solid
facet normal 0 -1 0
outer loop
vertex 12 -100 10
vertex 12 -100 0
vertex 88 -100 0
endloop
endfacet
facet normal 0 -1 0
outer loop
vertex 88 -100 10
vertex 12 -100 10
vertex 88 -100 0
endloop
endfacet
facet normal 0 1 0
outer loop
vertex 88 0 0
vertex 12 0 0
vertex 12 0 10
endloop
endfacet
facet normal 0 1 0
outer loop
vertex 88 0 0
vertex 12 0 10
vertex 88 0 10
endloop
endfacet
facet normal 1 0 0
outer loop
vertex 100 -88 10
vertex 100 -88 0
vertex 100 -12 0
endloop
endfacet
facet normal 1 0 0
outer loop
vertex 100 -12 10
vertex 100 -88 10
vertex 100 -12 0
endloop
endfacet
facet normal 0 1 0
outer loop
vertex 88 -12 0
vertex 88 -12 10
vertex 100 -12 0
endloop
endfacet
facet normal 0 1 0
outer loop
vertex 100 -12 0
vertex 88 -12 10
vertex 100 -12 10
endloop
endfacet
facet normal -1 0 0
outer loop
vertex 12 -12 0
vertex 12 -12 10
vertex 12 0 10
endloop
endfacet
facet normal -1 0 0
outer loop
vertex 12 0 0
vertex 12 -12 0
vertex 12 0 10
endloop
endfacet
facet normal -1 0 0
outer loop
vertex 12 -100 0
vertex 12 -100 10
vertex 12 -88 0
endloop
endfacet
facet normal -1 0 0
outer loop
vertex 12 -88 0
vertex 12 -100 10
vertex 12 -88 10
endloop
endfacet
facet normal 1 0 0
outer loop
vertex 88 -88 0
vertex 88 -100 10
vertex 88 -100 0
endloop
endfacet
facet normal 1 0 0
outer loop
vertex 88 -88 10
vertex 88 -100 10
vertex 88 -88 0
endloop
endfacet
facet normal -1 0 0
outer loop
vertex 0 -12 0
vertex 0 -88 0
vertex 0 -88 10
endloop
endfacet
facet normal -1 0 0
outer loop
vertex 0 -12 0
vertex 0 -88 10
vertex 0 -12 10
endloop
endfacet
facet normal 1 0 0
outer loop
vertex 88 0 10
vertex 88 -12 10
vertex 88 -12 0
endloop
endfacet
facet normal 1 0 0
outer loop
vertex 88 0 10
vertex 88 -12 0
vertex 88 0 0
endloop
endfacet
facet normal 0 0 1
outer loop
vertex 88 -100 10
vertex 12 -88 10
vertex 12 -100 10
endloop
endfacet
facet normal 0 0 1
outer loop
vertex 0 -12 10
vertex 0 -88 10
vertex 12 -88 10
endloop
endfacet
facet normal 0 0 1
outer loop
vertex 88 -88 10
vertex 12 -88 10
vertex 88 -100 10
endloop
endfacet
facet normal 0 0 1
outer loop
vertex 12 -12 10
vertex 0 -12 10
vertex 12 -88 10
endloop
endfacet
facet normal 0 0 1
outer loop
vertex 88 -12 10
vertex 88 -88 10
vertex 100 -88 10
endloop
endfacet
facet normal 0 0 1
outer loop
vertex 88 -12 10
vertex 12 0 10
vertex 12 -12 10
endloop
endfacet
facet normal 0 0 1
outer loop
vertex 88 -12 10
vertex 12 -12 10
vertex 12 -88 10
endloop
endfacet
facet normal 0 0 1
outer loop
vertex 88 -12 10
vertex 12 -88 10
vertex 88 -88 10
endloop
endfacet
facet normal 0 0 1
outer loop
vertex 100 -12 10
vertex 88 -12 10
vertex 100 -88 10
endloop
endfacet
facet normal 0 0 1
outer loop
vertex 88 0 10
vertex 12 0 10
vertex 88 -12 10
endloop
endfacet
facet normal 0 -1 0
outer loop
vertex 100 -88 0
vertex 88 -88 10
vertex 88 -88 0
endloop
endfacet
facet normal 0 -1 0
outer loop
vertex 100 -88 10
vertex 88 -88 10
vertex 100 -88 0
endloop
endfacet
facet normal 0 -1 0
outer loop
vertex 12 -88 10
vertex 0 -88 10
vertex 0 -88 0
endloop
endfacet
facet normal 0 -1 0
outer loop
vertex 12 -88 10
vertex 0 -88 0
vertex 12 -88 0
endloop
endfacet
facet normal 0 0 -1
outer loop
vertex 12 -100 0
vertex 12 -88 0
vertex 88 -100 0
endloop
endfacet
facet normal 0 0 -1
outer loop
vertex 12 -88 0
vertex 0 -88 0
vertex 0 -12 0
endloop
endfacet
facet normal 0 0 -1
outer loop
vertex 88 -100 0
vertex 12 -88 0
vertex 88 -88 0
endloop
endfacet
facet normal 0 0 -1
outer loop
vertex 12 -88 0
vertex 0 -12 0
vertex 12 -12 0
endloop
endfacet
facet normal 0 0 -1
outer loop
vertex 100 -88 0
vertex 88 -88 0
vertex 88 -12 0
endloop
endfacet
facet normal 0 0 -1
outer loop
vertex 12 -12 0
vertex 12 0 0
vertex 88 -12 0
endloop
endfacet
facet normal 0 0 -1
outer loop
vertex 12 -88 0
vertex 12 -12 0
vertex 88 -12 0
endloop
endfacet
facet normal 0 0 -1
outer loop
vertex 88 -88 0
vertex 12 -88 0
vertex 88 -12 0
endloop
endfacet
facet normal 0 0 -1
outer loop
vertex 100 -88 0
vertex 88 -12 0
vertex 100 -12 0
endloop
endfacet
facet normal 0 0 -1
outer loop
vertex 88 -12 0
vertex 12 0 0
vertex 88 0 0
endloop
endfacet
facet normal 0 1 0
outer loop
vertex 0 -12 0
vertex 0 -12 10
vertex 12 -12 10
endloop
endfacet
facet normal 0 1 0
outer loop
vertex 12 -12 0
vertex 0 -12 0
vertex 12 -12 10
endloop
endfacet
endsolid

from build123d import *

# Parameters (mm, degrees)
F0_W     = 500
F0_H     = 500
F1_DEPTH = 50
F2_W     = 60
F2_H     = 60
F3_DEPTH = 90
F4_SCALE = 0.2


with BuildPart() as f1:
    # F0 (on Top) → F1 (new body)
    with BuildSketch(Plane.XY):
        with Locations((250, -250)):
            Rectangle(F0_W, F0_H)
    extrude(amount=F1_DEPTH)

    # F2 (on face) → F3 (cut)
    with BuildSketch(Plane.XY.offset(50)):
        with Locations((470, -470)):
            Rectangle(F2_W, F2_H)
        with Locations((30, -30)):
            Rectangle(F2_W, F2_H)
        with Locations((30, -470)):
            Rectangle(F2_W, F2_H)
        with Locations((470, -30)):
            Rectangle(F2_W, F2_H)
    extrude(amount=-F3_DEPTH, mode=Mode.SUBTRACT)


with BuildPart() as f1_1:
    # F4: moved
    add(f1.part.scale(F4_SCALE))


solid = f1_1.part
